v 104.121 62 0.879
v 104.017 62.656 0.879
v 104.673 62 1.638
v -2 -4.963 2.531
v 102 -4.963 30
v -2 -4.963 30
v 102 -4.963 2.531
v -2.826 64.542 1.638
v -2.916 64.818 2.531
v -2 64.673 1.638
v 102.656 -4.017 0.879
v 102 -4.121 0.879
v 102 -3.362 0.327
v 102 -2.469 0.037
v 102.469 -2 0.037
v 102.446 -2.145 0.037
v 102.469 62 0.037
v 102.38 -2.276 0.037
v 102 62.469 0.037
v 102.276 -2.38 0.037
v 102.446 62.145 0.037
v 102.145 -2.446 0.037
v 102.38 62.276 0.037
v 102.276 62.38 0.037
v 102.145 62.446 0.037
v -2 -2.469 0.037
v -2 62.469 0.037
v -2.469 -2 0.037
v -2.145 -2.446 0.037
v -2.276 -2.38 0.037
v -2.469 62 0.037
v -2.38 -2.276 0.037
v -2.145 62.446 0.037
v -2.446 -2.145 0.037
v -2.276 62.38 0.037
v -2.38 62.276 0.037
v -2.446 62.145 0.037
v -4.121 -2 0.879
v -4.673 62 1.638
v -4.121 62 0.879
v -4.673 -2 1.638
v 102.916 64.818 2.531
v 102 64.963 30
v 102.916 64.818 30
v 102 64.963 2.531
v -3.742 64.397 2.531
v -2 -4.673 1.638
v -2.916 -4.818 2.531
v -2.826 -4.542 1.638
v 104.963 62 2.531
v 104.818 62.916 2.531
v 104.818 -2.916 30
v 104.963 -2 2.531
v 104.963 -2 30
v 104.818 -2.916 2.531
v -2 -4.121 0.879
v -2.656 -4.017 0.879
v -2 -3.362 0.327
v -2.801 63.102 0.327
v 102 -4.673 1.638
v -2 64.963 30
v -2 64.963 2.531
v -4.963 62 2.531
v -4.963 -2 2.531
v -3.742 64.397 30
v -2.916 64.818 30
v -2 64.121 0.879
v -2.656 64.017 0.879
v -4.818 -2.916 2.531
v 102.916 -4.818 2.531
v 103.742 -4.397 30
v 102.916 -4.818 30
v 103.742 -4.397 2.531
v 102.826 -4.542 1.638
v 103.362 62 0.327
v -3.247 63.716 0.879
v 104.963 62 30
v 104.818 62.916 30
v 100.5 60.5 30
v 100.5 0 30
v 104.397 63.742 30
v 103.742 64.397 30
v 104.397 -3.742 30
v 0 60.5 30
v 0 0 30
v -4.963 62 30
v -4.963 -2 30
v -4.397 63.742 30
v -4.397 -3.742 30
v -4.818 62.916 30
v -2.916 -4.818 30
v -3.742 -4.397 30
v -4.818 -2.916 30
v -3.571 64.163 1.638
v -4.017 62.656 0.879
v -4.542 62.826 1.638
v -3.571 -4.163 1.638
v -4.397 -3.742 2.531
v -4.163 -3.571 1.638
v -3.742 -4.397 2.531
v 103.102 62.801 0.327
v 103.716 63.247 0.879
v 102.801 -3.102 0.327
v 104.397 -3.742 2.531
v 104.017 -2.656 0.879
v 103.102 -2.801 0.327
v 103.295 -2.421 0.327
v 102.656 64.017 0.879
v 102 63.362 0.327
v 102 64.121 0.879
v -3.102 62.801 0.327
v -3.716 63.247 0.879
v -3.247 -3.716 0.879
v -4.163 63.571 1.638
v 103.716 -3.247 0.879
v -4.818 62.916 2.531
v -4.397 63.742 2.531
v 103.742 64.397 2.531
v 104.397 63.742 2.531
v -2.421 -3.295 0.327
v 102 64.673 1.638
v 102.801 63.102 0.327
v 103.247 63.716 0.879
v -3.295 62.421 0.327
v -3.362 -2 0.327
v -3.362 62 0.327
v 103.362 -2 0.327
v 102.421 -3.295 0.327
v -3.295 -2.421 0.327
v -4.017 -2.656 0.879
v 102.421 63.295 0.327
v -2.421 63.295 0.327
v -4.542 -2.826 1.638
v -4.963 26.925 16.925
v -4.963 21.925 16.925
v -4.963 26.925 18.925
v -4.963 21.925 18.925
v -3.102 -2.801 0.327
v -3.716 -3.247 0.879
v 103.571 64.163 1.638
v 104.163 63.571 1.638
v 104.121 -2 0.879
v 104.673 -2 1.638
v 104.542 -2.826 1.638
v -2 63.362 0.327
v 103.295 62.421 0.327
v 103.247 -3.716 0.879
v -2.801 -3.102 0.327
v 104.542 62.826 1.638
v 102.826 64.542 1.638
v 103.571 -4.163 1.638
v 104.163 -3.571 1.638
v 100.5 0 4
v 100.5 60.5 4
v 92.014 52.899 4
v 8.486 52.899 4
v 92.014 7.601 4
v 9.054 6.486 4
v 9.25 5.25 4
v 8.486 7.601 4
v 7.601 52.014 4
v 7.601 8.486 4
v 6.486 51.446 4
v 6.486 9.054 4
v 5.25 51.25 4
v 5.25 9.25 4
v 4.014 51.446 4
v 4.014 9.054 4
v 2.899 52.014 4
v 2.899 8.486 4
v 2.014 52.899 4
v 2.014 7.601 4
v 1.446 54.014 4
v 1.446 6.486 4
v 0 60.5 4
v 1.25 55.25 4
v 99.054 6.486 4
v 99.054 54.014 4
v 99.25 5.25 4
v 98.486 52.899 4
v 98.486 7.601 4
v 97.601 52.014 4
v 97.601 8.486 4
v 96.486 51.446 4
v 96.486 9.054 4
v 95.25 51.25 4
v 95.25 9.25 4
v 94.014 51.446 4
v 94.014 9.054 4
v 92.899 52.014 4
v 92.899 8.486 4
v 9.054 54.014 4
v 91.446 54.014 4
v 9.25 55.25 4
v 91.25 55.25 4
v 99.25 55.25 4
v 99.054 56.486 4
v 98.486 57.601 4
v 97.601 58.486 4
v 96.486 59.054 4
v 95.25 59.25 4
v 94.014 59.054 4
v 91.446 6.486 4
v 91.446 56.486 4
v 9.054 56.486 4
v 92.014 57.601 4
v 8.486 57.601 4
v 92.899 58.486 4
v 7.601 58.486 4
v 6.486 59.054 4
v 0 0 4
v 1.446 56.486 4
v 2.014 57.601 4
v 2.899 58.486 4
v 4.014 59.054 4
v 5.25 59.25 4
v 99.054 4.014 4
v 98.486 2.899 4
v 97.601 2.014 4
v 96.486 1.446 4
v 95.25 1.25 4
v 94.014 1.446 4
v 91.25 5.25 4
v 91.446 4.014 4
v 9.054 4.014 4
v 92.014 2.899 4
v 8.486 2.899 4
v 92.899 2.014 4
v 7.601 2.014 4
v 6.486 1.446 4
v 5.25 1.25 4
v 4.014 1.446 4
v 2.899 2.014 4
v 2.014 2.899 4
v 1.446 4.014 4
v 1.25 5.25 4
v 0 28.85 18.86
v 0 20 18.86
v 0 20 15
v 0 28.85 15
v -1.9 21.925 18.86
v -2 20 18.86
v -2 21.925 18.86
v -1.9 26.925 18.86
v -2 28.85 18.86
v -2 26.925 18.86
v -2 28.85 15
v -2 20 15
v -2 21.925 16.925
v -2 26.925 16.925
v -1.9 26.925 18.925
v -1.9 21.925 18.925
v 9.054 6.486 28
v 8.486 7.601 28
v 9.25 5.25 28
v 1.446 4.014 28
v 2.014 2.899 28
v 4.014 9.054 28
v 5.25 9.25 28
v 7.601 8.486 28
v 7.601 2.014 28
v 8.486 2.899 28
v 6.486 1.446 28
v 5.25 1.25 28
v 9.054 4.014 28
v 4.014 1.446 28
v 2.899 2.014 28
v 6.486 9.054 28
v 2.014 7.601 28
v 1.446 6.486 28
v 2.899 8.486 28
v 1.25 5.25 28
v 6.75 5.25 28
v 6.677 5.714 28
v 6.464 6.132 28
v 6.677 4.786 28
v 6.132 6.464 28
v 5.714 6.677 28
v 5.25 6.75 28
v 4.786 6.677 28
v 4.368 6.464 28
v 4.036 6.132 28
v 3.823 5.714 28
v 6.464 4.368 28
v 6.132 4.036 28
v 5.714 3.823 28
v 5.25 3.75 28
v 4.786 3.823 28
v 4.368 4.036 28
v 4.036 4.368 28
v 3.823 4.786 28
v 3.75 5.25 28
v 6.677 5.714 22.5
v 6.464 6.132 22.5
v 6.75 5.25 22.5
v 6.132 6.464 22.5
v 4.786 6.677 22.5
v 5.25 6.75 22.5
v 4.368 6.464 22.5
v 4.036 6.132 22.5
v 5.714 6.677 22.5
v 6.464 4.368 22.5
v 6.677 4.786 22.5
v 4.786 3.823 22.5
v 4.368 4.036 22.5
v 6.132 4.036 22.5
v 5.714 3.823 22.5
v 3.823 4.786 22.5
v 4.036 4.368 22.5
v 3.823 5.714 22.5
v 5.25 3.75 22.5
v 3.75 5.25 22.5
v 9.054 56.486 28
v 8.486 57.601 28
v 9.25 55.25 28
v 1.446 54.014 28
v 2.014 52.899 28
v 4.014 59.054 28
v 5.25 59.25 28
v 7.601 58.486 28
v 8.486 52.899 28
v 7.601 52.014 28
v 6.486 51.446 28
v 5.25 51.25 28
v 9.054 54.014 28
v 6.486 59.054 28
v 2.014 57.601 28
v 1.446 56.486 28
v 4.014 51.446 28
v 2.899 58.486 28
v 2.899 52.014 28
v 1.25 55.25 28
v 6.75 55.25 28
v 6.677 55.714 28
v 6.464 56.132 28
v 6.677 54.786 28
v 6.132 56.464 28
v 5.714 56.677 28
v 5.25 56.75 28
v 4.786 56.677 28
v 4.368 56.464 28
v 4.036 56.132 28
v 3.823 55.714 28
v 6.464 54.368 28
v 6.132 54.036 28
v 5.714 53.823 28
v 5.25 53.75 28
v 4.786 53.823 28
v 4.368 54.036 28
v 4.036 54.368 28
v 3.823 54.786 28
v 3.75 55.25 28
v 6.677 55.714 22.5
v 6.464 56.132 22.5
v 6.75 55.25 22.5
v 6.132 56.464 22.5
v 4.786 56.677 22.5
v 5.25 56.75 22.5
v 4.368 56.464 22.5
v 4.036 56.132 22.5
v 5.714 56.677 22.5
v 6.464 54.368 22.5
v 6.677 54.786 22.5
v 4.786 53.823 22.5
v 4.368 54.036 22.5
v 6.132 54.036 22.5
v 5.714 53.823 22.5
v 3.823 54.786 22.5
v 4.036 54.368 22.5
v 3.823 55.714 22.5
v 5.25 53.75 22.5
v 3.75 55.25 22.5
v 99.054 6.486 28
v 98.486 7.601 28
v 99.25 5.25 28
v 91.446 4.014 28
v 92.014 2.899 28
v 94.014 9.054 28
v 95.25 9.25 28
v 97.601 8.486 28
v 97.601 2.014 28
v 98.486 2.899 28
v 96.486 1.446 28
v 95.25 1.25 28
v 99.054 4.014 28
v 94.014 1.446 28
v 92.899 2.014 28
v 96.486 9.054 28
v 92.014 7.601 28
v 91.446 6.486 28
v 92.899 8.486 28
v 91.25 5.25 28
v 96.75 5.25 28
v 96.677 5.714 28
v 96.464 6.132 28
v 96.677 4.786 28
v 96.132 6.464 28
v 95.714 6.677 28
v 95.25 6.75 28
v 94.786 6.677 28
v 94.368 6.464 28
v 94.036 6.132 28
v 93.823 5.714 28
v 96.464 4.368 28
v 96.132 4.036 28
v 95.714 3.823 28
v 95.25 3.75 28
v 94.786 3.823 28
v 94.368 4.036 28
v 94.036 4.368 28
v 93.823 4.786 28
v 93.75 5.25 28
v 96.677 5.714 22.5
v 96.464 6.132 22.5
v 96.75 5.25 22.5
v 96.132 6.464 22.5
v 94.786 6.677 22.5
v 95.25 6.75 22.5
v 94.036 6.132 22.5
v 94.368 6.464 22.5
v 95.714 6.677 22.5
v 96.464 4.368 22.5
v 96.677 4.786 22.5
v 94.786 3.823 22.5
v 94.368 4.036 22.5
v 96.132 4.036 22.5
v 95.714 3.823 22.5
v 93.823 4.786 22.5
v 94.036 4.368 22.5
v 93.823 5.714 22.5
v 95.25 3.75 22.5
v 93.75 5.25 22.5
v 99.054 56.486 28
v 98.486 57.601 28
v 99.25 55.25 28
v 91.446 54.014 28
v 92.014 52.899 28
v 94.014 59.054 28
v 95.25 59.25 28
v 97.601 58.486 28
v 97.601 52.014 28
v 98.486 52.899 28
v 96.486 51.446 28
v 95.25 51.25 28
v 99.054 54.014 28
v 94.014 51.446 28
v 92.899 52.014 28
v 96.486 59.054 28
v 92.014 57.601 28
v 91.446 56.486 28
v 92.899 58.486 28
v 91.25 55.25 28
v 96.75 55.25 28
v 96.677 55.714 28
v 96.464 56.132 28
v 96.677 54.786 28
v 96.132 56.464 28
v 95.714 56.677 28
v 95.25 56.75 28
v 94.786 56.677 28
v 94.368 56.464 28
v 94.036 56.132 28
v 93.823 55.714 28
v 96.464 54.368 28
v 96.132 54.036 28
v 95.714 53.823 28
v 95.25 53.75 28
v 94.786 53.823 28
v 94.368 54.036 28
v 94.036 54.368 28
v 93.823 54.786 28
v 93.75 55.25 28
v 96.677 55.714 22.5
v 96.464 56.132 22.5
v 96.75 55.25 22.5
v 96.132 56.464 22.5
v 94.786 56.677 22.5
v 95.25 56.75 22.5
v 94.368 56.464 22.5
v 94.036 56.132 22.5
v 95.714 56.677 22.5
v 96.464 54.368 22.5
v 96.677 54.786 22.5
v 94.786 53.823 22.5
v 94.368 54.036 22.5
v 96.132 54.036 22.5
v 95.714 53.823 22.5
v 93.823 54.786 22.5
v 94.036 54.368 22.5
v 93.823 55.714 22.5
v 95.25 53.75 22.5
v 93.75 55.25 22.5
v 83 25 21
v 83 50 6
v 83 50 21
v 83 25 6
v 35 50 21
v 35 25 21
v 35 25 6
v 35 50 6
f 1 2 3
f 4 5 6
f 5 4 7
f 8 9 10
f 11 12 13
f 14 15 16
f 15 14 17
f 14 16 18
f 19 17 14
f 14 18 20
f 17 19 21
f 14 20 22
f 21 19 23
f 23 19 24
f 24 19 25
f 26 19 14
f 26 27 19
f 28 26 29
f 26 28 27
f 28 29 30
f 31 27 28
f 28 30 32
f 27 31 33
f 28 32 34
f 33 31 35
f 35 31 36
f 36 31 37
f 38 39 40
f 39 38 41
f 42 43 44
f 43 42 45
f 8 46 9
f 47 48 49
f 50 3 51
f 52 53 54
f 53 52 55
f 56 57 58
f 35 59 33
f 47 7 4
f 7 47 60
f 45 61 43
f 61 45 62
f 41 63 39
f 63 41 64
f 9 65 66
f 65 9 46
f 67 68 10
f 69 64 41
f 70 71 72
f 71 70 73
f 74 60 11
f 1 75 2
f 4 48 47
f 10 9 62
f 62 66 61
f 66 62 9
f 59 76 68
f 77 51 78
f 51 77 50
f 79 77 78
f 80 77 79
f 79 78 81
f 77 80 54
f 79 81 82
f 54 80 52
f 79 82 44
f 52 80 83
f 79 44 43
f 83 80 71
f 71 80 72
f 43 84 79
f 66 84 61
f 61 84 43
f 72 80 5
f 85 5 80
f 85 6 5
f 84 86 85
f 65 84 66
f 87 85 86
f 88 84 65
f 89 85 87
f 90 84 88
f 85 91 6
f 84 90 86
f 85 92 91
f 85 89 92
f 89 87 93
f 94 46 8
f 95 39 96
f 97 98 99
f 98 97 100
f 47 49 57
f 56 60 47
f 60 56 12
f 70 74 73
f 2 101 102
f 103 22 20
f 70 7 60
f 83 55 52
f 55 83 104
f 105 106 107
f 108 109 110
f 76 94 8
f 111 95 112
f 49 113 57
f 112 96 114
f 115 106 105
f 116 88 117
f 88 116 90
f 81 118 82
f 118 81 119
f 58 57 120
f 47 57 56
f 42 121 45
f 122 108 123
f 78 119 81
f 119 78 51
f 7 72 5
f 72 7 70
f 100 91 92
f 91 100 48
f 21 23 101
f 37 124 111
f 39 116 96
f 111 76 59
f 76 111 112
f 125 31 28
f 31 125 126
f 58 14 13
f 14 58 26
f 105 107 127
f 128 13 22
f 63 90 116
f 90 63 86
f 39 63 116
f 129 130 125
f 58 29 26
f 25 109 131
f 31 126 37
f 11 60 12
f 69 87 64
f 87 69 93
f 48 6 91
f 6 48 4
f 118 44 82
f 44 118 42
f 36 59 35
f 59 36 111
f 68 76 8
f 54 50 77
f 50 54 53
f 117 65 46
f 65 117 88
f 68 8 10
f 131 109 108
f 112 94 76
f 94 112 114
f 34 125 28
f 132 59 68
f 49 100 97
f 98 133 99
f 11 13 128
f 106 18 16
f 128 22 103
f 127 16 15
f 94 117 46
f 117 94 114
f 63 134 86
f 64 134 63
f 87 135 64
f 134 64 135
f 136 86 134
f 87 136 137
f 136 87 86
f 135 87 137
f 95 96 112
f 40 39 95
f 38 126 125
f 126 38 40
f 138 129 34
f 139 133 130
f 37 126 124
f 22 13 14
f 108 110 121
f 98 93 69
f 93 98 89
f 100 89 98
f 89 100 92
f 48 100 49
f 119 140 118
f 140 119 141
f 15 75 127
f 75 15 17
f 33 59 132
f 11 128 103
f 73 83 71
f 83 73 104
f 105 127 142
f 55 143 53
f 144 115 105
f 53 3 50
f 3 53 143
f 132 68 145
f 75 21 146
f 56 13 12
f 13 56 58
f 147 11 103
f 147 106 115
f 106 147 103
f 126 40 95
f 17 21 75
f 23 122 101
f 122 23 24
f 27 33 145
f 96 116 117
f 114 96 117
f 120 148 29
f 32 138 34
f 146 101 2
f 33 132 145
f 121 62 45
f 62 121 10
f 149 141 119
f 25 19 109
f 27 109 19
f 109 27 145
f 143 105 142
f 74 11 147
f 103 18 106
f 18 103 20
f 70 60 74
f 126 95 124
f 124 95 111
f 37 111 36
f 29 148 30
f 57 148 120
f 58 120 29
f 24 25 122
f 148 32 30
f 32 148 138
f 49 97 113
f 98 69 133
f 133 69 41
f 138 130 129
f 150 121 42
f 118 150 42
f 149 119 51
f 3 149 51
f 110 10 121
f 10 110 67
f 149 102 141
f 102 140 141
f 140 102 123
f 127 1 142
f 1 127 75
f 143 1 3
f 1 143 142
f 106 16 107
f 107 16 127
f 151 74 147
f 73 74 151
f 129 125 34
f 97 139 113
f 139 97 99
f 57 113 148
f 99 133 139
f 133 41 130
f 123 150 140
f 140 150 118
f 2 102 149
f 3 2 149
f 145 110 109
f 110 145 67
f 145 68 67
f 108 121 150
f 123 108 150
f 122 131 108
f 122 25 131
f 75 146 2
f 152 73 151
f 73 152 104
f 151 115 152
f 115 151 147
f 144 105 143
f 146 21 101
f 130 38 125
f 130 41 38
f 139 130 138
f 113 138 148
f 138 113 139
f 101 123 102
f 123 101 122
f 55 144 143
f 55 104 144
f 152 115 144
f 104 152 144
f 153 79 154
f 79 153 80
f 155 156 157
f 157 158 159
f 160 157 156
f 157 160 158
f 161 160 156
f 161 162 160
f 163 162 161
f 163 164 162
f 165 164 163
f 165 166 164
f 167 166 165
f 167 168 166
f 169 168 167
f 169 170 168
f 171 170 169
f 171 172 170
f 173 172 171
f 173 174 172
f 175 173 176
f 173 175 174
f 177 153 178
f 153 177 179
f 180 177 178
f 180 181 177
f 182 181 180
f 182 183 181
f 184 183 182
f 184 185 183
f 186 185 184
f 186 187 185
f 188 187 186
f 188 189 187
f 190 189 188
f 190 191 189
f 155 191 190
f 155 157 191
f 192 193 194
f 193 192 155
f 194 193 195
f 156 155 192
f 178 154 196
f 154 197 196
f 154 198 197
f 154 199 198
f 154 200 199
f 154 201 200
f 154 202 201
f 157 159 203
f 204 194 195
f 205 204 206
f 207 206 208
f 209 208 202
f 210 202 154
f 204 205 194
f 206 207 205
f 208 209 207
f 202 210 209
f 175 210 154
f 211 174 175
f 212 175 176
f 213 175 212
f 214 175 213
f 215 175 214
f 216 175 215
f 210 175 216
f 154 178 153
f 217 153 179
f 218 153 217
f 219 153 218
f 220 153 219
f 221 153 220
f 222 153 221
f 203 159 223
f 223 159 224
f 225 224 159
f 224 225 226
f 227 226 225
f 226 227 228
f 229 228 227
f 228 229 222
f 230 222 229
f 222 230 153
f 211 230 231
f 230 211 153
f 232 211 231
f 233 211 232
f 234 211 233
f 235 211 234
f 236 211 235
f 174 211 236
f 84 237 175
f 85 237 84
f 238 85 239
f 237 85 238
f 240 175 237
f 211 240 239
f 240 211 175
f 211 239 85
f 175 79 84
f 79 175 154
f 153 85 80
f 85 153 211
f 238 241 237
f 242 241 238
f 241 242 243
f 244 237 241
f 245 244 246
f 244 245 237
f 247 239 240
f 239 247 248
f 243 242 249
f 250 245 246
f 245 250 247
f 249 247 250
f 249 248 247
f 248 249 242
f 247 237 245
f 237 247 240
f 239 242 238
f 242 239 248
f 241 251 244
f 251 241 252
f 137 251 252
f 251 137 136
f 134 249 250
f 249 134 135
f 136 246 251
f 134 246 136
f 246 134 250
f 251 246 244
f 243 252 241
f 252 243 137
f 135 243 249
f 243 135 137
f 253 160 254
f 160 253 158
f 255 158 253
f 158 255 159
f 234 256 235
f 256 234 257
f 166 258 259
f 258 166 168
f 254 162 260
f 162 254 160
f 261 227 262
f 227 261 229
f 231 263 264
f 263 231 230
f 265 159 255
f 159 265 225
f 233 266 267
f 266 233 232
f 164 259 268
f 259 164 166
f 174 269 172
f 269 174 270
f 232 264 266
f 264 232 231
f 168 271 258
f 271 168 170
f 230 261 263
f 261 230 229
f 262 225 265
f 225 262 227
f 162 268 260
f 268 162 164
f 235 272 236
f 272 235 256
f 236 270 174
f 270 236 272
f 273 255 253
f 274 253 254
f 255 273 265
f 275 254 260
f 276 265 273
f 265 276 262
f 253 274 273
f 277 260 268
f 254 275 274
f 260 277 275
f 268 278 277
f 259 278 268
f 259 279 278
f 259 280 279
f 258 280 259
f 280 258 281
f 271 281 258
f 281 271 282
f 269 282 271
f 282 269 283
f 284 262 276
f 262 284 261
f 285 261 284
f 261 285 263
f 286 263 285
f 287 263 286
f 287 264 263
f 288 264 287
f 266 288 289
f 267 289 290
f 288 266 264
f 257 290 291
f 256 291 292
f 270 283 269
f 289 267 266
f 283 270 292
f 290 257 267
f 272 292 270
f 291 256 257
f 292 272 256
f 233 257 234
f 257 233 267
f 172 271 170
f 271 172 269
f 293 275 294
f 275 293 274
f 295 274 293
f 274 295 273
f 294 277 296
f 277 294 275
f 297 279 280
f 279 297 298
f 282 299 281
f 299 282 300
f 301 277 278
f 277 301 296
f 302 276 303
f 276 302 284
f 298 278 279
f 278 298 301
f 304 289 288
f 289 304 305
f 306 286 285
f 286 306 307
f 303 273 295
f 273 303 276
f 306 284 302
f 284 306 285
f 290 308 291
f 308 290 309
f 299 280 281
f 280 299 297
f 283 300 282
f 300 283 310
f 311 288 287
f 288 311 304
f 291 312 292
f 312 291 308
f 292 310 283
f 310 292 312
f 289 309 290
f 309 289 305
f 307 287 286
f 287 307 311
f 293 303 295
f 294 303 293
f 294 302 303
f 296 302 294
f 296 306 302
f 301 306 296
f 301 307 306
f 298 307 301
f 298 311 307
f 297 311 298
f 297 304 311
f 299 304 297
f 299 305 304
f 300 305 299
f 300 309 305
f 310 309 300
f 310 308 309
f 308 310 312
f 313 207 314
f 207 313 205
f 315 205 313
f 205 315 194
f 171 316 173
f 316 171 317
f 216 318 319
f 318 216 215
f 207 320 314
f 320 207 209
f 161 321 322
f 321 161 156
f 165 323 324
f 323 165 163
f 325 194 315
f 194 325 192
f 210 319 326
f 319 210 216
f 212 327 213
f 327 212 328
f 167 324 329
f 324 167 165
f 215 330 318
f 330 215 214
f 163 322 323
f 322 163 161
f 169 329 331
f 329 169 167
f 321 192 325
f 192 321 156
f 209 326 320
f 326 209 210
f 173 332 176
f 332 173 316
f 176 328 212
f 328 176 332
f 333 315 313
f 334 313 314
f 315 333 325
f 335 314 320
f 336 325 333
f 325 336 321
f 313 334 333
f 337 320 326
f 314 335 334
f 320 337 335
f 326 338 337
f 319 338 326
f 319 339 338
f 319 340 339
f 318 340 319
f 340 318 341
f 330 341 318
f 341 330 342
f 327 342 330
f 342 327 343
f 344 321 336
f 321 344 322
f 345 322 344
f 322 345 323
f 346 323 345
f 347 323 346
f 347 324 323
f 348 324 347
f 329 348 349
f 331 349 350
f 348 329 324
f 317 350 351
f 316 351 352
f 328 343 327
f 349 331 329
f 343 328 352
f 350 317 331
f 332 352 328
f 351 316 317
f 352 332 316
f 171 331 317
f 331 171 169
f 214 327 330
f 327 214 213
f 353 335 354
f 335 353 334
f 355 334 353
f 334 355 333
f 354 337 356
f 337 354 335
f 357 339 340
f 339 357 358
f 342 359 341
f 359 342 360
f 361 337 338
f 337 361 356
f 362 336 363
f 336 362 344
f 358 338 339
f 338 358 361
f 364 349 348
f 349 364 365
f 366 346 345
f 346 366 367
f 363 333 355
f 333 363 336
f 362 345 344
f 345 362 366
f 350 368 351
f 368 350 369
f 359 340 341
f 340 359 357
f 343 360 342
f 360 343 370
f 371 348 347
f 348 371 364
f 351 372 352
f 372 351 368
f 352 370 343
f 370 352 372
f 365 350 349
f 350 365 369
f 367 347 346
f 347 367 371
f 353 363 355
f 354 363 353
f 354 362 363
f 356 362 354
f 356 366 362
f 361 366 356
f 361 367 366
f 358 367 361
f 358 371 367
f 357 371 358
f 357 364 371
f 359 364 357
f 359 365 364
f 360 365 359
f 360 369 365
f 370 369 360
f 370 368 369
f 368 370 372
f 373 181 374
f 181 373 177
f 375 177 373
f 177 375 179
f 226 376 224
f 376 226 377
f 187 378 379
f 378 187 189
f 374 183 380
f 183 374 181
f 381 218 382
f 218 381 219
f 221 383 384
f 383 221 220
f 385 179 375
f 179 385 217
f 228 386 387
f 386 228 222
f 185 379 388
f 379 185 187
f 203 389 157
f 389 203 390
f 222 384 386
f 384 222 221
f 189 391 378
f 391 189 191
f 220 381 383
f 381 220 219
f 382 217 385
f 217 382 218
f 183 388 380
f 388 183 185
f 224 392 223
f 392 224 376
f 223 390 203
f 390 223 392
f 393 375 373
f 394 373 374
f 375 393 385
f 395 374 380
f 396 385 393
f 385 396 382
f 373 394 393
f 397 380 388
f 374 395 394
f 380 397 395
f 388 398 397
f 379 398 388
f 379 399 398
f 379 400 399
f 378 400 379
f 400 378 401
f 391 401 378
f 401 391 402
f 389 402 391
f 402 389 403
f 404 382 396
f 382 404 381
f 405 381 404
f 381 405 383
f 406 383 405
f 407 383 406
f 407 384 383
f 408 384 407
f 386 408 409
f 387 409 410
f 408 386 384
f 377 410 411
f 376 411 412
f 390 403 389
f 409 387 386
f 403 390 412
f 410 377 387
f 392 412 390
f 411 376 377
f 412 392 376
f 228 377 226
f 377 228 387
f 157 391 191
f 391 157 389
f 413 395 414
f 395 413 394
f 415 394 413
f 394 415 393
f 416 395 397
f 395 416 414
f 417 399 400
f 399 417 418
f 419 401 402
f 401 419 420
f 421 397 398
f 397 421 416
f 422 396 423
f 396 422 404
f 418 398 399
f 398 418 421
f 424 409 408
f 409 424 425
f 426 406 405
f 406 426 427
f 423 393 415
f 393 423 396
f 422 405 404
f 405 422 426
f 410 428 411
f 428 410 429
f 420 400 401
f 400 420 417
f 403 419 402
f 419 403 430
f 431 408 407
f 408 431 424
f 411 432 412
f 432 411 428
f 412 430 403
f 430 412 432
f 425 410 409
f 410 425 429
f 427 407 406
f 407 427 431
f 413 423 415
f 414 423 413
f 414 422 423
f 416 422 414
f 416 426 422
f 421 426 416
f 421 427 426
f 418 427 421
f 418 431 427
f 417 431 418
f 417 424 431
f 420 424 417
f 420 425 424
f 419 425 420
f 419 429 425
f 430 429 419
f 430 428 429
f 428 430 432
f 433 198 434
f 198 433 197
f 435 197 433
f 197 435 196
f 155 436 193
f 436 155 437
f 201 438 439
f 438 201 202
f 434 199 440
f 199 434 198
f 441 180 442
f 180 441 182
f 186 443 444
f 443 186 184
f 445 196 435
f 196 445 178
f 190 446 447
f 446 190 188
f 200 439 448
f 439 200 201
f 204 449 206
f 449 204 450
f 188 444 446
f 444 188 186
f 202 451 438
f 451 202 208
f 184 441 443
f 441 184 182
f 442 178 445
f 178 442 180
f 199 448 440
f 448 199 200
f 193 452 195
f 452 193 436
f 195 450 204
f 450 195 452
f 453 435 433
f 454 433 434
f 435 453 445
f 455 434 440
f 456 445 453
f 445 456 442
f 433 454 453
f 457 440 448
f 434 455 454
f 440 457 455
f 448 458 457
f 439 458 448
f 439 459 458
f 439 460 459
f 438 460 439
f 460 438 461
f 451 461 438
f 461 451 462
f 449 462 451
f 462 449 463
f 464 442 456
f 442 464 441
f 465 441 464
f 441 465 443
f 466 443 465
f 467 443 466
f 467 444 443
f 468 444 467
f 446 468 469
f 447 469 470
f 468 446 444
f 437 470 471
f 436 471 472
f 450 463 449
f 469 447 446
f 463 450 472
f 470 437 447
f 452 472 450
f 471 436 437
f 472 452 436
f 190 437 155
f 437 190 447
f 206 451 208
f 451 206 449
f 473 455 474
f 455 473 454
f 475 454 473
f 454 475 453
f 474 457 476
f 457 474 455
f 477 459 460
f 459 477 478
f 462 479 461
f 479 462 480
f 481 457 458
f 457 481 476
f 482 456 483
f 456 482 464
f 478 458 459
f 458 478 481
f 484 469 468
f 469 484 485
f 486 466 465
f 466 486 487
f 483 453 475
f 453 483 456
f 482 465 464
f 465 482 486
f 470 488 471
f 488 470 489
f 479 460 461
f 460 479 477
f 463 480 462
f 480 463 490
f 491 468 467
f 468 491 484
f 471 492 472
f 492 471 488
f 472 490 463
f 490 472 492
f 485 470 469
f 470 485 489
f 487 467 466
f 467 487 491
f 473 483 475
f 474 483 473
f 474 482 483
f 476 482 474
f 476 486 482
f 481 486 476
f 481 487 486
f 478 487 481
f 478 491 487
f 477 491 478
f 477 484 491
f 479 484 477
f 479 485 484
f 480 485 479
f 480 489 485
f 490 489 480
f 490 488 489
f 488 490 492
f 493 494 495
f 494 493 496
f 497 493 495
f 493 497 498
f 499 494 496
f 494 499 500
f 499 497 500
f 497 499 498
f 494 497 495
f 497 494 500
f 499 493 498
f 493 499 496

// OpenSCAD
// -> increase the number for smoother edges
$fn = 20;
// -> the length of the box
length=110.0;
// -> the width of the box
width=70.0;
// -> the total height of the box 
height=30.0;
// -> the radius of fillets and outer roundings
filletRadius=3.0;

///////////////////////////////////////////////////////////////////////////////////////
// creates a box with rounded edges all around except on the top
module roundedBox01(length, width, height, radius)
{
    translate([radius,radius,radius])
    hull() 
    {
        sphere(radius);
        translate([length-2*radius, 0, 0])              sphere(radius);
        translate([length-2*radius, width-2*radius, 0]) sphere(radius);
        translate([0, width-2*radius, 0])               sphere(radius);
        
        translate([0, 0, height-radius])                            halfSphere(radius);
        translate([length-2*radius, 0, height-radius])              halfSphere(radius);
        translate([length-2*radius, width-2*radius, height-radius]) halfSphere(radius);
        translate([0, width-2*radius, height-radius])               halfSphere(radius);
    }
}

///////////////////////////////////////////////////////////////////////////////////////
// creates half of a sphere
module halfSphere(radius)
{
    difference()
    {
        sphere(radius);
        translate([-1.5*radius, -1.5*radius, 0]) cube(3*radius);
    }
}

module standoff(x,y){
    difference(){
        translate([x,y,2])cylinder(d=8,h=height-4);
        translate([x,y,height*3/4])cylinder(d=3,h=height);
        
    }
}

/////////////////////
// Main Box
sw_x = 8.85;
sw_hole_x = 5;
sw_x_pad = (sw_x-sw_hole_x) / 2;
sw_y = 3.86;
sw_hole_y = 2;
sw_y_pad = (sw_x-sw_hole_x) / 2;

cut_h = 15;
cut_y = 20;
difference(){
    translate([-5,-5,0])roundedBox01(length, width, height, filletRadius);
    translate([0,0,4])cube([100.5,60.5,100]);
    
    translate([-2,cut_y,cut_h])
            cube([10,sw_x,sw_y]);
    // cover over switch hole
        translate([-5,cut_y+sw_x_pad,cut_h+sw_y_pad])cube([3.1,sw_hole_x,sw_hole_y]);
};
standoff(5.25,5.25);
standoff(5.25,55.25);
standoff(95.25,5.25);
standoff(95.25,55.25);

// dummy battery
translate([35,25,6])cube([48,25,15]);
